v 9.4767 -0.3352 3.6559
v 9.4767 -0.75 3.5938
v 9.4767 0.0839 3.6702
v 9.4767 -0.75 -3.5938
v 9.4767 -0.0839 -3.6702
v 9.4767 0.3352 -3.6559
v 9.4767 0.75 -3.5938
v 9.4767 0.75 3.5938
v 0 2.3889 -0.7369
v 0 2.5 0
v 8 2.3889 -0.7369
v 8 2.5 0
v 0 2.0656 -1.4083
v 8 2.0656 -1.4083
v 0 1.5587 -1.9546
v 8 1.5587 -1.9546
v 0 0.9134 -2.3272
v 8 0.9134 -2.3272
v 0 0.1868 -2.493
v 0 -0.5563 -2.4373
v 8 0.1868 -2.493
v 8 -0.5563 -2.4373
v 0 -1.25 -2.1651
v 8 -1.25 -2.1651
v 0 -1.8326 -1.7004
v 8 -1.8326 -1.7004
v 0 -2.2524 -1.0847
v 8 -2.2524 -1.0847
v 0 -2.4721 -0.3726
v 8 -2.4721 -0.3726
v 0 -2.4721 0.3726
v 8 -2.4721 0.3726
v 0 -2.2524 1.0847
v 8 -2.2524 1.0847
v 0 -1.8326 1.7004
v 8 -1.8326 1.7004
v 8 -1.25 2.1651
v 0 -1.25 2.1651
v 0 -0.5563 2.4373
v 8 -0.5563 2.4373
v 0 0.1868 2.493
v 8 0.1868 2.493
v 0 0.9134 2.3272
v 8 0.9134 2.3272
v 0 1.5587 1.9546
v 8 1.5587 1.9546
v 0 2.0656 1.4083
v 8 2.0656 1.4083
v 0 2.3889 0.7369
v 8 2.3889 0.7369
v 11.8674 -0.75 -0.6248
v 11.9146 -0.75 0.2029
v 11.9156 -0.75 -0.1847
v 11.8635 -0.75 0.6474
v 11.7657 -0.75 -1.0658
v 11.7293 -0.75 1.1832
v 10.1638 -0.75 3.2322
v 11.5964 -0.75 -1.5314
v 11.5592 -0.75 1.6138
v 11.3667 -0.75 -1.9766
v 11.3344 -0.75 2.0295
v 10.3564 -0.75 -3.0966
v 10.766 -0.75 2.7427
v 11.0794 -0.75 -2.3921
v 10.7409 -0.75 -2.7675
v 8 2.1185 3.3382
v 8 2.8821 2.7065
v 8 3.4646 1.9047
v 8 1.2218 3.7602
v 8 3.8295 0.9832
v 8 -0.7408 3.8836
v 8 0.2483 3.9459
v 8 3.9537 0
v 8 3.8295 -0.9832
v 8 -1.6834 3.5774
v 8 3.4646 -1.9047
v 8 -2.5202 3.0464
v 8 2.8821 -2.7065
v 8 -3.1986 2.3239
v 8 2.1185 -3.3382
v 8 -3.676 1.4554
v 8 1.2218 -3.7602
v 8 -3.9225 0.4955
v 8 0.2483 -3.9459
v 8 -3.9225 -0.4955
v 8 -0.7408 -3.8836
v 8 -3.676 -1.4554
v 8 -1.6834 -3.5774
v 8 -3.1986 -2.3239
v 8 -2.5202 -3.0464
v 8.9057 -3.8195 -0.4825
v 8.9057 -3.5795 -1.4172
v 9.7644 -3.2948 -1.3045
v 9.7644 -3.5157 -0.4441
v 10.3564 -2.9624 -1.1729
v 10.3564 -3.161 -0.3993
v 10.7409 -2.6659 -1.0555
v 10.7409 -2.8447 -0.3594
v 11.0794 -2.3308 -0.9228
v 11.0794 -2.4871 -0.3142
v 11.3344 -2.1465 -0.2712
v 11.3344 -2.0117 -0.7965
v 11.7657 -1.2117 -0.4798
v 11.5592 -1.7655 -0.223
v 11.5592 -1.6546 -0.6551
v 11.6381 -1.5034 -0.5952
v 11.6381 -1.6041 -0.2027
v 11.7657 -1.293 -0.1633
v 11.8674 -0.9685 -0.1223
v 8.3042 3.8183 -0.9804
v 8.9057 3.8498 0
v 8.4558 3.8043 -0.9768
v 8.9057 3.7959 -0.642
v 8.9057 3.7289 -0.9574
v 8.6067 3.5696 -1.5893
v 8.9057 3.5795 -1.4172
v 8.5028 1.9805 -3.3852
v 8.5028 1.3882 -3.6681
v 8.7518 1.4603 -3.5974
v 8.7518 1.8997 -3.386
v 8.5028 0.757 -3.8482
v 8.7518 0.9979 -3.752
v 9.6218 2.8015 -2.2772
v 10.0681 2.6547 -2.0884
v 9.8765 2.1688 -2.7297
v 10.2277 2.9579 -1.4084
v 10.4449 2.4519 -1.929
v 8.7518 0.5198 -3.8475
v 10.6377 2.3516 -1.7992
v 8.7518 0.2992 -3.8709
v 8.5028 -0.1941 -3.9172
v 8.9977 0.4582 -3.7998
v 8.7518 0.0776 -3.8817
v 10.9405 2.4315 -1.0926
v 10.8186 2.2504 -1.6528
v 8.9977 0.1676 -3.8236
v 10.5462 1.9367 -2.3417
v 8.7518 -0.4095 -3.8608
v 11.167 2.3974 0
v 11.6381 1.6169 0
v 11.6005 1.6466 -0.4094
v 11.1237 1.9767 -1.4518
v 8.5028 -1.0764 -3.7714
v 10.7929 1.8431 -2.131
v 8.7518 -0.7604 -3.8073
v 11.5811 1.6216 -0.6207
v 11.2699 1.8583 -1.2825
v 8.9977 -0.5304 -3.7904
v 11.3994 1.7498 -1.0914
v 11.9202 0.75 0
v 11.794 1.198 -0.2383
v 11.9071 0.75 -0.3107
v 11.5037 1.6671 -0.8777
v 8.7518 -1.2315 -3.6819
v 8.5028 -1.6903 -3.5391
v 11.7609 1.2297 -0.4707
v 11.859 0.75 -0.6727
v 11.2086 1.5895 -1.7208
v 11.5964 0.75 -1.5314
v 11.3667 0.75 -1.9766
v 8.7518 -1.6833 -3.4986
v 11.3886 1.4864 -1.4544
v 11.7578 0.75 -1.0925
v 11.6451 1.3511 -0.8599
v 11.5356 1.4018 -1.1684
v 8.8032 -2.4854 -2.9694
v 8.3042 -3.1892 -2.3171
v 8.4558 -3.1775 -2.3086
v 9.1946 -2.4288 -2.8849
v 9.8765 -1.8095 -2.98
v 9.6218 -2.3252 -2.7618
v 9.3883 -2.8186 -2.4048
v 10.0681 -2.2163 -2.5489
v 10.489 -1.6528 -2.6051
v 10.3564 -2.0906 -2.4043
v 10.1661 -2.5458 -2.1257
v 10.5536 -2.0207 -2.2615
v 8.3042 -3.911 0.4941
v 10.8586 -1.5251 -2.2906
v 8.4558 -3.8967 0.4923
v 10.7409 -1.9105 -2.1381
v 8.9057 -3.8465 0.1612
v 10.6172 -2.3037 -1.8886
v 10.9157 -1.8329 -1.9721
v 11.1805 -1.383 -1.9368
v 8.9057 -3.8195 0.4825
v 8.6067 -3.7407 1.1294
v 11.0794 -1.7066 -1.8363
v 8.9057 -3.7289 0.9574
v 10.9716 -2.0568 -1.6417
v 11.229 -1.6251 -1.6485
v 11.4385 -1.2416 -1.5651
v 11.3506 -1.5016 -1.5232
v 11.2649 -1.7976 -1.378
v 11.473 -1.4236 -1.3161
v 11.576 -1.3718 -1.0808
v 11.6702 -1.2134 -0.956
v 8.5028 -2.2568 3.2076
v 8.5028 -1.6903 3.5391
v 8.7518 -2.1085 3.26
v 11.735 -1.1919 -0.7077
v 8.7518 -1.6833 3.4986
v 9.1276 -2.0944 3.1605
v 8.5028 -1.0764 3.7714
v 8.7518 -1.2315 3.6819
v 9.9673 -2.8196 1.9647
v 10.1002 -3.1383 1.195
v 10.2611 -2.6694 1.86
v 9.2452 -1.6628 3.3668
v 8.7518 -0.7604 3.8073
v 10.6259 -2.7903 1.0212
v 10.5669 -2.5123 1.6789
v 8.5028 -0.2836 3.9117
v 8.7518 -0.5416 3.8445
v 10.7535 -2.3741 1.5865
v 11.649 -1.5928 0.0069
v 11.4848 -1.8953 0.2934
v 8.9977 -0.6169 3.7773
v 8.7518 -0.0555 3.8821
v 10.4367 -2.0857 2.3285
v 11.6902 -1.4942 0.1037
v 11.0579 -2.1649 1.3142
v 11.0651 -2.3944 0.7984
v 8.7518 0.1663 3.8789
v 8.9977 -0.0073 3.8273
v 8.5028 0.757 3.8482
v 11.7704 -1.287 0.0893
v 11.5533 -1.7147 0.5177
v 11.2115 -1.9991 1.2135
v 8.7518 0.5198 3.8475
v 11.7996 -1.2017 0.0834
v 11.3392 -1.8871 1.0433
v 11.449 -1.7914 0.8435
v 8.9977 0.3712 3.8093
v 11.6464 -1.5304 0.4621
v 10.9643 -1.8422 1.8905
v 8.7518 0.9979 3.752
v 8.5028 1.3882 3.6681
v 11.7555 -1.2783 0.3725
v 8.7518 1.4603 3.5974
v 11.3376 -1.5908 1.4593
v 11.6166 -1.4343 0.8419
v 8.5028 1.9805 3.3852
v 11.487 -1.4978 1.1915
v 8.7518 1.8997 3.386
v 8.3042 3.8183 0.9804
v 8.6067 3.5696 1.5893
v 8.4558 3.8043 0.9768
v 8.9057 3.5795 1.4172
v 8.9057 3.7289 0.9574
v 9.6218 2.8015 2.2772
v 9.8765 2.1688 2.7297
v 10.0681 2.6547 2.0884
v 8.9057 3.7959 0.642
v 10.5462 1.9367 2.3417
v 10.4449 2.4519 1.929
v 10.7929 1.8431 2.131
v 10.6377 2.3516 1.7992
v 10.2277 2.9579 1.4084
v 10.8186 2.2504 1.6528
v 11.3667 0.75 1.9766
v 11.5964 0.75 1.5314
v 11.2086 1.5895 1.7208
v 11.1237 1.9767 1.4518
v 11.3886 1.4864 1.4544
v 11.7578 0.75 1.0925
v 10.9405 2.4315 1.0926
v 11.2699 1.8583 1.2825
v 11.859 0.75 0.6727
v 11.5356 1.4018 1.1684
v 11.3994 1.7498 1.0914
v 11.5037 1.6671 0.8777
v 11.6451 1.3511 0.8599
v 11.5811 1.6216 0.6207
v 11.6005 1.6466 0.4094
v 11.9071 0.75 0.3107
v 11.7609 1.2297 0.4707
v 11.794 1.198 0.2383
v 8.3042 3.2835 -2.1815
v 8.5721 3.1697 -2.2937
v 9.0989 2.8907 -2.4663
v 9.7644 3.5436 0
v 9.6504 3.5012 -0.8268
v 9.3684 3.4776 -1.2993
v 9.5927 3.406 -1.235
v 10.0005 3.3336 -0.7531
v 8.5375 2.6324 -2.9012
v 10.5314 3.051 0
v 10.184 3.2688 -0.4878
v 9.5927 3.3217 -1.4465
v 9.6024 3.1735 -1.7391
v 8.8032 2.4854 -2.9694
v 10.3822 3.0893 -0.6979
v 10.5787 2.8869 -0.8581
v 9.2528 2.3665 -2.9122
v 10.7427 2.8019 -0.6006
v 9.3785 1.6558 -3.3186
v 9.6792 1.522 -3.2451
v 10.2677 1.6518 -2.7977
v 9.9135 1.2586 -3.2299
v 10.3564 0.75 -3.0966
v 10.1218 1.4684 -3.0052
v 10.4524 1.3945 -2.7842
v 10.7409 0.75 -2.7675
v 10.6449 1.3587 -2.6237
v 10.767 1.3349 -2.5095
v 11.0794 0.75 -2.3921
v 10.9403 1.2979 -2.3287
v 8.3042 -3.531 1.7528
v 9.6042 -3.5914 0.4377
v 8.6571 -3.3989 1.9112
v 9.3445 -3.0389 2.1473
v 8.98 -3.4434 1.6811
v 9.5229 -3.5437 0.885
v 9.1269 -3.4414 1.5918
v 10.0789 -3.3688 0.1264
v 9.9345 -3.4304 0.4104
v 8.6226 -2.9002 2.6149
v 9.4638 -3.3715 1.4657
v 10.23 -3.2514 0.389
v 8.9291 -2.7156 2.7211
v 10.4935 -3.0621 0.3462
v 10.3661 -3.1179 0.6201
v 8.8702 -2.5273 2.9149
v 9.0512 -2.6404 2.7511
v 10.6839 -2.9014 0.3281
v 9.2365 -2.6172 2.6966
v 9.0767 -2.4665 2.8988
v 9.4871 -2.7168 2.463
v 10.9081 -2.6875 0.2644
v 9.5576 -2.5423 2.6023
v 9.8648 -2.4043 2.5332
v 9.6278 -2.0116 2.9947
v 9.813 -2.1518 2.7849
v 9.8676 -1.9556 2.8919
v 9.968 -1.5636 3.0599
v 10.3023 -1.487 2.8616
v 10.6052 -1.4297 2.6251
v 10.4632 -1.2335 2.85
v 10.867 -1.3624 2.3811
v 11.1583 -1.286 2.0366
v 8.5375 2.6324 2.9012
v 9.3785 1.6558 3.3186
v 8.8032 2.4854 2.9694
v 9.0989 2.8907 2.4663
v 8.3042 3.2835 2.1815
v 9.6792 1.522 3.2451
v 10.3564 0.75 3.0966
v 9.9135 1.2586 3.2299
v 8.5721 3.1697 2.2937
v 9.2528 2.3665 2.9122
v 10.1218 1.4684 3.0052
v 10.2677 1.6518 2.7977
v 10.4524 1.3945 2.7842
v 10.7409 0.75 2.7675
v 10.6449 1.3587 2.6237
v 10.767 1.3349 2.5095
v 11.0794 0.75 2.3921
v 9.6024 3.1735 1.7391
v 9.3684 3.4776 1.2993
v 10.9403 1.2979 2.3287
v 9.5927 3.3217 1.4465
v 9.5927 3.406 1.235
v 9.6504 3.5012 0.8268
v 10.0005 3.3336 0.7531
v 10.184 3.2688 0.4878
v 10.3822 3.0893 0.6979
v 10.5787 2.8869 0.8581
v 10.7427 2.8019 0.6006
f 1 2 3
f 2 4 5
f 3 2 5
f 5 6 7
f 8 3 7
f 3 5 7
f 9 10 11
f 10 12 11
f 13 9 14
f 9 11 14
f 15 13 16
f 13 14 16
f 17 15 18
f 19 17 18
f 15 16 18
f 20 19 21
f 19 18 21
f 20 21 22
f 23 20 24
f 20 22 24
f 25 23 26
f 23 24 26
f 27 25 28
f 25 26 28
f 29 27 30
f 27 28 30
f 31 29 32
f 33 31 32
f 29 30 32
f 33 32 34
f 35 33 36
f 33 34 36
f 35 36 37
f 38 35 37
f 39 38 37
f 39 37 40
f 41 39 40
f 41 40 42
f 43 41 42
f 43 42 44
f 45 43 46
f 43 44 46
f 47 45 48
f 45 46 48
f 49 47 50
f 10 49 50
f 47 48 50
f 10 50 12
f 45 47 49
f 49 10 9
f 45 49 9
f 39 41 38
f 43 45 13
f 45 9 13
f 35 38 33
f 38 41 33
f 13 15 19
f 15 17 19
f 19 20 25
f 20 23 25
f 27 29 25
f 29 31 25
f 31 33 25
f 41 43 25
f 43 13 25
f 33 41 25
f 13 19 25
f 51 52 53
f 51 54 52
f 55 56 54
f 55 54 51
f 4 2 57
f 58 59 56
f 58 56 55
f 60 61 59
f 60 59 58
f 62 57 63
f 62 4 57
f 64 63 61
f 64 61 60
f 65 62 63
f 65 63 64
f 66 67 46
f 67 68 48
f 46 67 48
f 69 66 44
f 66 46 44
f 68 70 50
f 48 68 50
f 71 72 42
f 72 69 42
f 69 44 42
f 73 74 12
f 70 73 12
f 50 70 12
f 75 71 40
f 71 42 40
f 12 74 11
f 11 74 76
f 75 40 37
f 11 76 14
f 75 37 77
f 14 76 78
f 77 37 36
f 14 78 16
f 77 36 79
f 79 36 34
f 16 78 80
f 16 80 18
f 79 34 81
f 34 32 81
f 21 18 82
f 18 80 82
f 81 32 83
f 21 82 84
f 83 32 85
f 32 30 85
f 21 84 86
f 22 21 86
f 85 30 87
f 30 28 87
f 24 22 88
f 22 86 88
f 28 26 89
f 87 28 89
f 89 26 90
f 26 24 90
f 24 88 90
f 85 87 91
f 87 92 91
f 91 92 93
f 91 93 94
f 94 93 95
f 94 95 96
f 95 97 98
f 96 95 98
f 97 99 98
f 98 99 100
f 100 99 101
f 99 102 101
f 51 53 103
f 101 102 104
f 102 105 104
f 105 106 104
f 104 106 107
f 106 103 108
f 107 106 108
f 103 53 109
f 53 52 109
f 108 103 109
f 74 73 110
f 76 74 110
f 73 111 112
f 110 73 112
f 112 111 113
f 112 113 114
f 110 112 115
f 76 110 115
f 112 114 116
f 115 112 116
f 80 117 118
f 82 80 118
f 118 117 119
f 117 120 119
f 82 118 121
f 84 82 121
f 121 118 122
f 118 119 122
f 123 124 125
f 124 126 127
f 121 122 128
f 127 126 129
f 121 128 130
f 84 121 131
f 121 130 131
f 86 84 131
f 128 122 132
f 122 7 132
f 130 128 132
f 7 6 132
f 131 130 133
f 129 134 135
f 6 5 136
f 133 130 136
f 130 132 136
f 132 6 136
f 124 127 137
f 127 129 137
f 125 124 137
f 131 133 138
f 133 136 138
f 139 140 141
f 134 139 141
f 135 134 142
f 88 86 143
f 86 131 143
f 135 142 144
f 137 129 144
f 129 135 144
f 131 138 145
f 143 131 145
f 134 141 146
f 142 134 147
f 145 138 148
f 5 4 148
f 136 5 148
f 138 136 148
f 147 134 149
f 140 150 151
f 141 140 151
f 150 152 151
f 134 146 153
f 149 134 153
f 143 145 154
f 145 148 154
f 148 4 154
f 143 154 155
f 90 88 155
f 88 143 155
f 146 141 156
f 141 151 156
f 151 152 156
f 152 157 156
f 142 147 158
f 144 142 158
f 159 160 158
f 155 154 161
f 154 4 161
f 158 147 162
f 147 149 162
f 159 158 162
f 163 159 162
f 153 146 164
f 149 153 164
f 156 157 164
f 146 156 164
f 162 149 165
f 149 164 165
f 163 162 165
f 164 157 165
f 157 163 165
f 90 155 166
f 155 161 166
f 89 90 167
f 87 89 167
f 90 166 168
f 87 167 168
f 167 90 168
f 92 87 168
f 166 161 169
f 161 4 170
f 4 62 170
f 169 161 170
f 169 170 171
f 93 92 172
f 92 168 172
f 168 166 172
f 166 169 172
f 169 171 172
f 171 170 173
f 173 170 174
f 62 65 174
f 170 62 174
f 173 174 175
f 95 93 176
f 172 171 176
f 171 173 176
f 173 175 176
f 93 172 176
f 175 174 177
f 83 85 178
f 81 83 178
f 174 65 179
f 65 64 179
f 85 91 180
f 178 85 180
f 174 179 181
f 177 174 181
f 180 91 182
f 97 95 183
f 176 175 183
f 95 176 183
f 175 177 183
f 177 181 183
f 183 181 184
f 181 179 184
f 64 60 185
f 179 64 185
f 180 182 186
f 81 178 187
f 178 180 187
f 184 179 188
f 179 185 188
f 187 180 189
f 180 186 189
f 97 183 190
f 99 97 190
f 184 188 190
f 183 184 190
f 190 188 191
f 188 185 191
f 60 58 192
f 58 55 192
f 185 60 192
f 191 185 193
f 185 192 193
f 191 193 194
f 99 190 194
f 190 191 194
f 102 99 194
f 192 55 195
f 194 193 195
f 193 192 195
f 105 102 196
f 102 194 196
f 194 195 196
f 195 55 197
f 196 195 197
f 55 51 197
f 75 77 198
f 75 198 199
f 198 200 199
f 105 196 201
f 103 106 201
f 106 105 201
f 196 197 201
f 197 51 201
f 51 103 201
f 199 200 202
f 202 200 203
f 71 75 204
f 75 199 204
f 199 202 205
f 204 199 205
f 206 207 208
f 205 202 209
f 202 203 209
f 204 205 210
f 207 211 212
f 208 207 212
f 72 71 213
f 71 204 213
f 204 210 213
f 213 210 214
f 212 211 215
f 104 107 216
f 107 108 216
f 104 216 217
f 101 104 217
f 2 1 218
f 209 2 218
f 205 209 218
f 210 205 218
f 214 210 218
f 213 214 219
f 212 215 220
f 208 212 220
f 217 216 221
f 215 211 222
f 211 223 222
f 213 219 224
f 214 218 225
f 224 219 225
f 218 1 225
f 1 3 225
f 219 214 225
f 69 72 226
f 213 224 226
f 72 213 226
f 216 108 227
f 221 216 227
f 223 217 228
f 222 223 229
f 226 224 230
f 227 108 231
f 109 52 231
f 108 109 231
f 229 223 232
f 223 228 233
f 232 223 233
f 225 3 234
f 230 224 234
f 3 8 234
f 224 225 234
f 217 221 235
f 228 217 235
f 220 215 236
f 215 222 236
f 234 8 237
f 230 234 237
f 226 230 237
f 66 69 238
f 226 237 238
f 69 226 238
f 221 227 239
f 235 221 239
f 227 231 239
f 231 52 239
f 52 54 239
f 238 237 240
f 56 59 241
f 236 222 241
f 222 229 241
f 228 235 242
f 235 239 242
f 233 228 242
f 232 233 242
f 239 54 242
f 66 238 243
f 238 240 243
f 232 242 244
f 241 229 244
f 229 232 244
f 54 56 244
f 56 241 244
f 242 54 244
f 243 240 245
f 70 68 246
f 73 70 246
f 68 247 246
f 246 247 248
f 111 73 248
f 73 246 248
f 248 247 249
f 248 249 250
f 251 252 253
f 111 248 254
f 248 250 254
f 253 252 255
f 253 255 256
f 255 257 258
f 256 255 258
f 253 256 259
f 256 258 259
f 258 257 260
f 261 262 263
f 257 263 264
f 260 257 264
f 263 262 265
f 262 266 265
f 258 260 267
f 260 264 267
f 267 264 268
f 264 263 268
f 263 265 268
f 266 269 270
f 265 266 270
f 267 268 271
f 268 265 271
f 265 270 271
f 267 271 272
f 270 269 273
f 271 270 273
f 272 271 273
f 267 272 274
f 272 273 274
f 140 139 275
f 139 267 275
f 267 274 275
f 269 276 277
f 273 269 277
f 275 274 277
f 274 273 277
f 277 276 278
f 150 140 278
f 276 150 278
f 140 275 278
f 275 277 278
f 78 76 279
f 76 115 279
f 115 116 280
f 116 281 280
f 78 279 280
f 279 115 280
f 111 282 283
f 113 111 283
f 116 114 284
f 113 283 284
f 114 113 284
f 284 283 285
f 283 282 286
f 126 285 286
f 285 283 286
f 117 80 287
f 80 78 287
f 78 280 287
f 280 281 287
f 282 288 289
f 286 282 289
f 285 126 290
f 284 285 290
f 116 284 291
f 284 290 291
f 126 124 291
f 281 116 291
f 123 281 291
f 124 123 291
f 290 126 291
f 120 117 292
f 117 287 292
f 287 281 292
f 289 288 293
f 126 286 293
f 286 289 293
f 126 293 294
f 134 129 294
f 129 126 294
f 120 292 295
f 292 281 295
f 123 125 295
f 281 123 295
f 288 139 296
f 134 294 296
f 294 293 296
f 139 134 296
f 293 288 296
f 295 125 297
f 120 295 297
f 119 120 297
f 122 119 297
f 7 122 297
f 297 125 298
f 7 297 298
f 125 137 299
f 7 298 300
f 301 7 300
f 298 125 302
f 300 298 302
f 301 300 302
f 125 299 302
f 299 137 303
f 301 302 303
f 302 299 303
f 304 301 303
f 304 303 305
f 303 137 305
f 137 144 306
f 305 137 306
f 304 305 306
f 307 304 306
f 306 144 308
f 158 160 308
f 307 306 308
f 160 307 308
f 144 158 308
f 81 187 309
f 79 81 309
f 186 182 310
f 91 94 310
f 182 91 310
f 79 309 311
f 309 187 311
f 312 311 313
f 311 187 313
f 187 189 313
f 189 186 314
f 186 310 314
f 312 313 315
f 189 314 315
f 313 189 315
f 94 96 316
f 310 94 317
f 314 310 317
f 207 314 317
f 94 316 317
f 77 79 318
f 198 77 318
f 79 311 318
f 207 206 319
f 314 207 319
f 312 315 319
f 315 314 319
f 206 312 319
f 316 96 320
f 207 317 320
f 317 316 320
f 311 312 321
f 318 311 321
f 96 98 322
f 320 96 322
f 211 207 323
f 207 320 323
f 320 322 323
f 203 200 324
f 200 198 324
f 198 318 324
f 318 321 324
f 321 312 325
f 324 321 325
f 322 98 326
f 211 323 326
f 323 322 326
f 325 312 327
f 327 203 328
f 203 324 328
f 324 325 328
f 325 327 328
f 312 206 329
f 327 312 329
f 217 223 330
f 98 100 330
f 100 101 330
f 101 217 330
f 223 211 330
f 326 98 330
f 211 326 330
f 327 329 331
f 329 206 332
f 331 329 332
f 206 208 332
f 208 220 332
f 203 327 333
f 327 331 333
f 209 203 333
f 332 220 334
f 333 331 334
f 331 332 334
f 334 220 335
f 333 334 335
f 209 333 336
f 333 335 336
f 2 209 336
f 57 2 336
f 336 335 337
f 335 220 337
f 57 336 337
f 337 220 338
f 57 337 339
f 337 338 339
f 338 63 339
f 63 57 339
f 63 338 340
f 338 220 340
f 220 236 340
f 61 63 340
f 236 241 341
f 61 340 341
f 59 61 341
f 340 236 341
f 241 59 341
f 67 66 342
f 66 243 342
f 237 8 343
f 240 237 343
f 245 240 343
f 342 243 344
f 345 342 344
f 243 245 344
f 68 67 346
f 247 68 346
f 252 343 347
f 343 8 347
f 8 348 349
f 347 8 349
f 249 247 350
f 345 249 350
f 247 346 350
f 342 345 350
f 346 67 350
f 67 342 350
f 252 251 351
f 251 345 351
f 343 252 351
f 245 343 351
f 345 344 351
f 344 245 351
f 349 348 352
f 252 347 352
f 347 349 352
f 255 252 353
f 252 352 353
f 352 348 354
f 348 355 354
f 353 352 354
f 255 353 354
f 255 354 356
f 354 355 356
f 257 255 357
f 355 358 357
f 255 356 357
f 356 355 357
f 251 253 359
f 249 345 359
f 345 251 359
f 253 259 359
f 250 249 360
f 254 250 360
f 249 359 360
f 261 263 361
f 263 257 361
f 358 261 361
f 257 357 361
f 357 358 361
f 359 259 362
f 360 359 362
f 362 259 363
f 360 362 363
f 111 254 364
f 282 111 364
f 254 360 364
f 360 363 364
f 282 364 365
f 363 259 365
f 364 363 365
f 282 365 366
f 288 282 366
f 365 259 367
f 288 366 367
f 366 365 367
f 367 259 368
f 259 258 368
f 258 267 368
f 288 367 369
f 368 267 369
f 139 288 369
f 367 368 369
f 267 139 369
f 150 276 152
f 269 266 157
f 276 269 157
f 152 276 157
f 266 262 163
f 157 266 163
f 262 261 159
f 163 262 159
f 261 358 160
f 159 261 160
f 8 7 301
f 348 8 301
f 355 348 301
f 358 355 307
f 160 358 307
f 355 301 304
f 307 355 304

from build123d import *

# Parameters (mm, degrees)
CORTE_EXTRUS_O1_DEPTH      = 14.238697312
CORTE_EXTRUS_O1_DEPTH_BACK = 14.238697312
ESBO_O2_W                  = 3.17038165
ESBO_O2_H                  = 1.5


with BuildPart() as part:
    # Esboço1 → Revolução1 (revolve)
    with BuildSketch(Plane.XY):
        with BuildLine():
            Line((0, 0), (0, 2.5))
            Line((0, 2.5), (8, 2.5))
            Line((8, 2.5), (8, 3.953675657))
            ThreePointArc((8, 3.953675657), (10.812174165, 2.798528059), (12, 0))
            Line((12, 0), (0, 0))
        make_face()
    revolve(axis=Axis((12, 0, 0), (-1, 0, 0)))

    # Esboço2 → Corte-extrusão1 (cut, two sides: drawn at the far end of the back side and taken through both)
    with BuildSketch(Plane.XY.offset(-CORTE_EXTRUS_O1_DEPTH_BACK)):
        with Locations((11.06193306, 0)):
            Rectangle(ESBO_O2_W, ESBO_O2_H)
    extrude(amount=CORTE_EXTRUS_O1_DEPTH + CORTE_EXTRUS_O1_DEPTH_BACK, mode=Mode.SUBTRACT)


solid = part.part
